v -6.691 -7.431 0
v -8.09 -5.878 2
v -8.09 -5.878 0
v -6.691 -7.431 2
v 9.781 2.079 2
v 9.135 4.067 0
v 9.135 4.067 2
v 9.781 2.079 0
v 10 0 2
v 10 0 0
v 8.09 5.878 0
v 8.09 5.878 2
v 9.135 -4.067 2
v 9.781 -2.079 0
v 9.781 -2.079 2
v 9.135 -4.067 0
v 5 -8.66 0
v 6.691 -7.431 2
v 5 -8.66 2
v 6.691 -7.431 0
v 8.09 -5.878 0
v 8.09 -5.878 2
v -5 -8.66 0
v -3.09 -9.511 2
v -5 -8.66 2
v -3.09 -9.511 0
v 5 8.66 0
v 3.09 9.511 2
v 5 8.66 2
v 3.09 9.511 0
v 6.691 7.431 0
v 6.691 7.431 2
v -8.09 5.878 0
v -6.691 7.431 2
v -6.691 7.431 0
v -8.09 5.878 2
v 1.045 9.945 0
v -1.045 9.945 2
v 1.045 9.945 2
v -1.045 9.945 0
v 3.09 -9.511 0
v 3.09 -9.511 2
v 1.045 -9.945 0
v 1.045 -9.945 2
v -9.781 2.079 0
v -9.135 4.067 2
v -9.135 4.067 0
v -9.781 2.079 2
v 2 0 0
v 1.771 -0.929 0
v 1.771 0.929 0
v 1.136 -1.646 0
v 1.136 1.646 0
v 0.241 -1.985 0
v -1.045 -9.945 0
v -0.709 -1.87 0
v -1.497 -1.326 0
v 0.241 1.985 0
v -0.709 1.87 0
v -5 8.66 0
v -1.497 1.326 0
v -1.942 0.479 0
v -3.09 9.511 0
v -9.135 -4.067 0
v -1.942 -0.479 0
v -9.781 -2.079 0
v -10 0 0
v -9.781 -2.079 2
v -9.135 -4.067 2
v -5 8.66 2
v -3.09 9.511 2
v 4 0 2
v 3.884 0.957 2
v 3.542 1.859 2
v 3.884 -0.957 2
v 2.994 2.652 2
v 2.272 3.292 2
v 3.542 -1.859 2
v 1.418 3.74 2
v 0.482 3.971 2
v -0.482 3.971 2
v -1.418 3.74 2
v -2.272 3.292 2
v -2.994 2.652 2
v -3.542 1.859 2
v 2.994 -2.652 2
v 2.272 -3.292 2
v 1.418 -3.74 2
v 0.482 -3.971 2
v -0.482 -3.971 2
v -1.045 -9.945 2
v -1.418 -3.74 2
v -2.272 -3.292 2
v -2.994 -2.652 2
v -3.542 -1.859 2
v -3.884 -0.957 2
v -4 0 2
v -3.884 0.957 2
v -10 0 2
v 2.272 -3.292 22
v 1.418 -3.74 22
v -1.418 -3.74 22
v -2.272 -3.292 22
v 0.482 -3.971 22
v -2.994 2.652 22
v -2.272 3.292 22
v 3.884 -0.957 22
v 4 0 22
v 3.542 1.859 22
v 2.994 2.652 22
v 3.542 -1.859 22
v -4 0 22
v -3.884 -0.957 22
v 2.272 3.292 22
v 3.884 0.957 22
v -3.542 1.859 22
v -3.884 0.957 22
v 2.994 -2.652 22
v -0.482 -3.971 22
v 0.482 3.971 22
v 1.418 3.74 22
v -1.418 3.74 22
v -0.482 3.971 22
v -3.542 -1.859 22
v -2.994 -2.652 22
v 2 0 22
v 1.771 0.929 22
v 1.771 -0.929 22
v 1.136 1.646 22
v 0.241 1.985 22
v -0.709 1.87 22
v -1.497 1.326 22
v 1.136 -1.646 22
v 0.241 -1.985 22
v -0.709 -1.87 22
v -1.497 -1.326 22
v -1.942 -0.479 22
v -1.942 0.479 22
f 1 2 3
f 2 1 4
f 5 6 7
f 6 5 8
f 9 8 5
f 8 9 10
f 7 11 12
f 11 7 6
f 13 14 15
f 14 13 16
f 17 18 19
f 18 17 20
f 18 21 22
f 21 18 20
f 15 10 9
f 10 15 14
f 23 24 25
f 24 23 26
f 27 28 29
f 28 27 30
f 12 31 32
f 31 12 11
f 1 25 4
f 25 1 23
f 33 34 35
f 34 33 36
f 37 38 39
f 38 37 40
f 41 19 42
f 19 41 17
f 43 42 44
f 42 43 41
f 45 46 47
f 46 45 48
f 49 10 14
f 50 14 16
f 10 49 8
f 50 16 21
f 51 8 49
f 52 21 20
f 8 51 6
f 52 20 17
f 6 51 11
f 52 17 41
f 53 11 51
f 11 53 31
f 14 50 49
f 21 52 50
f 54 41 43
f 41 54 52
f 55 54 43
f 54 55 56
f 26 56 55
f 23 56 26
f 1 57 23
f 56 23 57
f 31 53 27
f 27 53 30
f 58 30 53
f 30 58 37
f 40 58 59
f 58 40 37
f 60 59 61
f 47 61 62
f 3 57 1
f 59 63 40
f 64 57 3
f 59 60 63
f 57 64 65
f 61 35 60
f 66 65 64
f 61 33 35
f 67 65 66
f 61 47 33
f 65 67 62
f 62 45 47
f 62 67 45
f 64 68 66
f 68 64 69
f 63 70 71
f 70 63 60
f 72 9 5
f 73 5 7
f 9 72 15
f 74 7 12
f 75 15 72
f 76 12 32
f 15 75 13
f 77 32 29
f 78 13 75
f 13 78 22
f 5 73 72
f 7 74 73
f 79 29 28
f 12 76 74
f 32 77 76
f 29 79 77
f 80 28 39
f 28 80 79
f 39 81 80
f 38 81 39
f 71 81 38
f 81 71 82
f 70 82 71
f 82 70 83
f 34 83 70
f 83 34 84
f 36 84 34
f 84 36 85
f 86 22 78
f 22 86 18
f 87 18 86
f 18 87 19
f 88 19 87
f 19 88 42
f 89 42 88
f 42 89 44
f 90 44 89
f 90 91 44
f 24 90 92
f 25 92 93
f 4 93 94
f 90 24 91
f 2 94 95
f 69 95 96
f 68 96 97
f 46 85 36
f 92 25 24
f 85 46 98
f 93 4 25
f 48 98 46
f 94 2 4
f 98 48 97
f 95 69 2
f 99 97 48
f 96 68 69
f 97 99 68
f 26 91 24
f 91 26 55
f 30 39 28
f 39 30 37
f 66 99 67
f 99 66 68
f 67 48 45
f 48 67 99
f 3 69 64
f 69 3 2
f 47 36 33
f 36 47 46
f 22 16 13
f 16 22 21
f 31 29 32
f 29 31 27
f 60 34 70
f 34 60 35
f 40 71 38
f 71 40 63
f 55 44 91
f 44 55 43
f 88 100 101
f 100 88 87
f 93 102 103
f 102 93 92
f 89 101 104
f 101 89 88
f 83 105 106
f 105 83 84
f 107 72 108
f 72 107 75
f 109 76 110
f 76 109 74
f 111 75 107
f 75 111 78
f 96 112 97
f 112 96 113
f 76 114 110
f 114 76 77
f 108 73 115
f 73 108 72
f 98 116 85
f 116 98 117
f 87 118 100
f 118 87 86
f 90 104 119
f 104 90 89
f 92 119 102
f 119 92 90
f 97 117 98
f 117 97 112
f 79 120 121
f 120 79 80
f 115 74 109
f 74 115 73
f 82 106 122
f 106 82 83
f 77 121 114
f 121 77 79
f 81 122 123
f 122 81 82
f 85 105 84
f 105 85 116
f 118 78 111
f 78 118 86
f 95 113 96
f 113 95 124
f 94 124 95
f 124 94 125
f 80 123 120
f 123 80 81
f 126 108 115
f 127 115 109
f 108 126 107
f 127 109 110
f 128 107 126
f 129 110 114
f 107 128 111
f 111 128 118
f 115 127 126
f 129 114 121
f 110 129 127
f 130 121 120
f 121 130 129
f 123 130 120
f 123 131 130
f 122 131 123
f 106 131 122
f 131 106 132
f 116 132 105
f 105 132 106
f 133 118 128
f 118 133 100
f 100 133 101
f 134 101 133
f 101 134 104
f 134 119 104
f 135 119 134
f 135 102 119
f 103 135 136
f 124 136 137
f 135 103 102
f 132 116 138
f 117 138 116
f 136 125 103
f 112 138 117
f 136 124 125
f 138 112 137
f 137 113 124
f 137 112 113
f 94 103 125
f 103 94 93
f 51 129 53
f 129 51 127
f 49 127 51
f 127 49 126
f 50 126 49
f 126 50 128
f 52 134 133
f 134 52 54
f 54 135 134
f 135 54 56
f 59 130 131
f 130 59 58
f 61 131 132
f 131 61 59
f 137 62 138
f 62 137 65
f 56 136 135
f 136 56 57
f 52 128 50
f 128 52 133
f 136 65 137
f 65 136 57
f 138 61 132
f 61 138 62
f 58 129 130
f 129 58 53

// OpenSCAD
//CUSTOMIZER VARIABLES

// Inner radius
inner_radius = 2;

// Flange radius
flange_radius = 10;

// Bushing radius
bushing_radius = 4;

// Bushing height
bushing_height = 20;

// Flange height
flange_height = 2;

//CUSTOMIZER VARIABLES END

total_height = flange_height + bushing_height;

$fs=1;

module bushing() {
	// Flange
	cylinder(h=flange_height, r=flange_radius);
	// Bushing
	cylinder(h=total_height, r=bushing_radius);
};

difference() {
	bushing();
	//Center hole
	cylinder(h=total_height, r=inner_radius);
};
